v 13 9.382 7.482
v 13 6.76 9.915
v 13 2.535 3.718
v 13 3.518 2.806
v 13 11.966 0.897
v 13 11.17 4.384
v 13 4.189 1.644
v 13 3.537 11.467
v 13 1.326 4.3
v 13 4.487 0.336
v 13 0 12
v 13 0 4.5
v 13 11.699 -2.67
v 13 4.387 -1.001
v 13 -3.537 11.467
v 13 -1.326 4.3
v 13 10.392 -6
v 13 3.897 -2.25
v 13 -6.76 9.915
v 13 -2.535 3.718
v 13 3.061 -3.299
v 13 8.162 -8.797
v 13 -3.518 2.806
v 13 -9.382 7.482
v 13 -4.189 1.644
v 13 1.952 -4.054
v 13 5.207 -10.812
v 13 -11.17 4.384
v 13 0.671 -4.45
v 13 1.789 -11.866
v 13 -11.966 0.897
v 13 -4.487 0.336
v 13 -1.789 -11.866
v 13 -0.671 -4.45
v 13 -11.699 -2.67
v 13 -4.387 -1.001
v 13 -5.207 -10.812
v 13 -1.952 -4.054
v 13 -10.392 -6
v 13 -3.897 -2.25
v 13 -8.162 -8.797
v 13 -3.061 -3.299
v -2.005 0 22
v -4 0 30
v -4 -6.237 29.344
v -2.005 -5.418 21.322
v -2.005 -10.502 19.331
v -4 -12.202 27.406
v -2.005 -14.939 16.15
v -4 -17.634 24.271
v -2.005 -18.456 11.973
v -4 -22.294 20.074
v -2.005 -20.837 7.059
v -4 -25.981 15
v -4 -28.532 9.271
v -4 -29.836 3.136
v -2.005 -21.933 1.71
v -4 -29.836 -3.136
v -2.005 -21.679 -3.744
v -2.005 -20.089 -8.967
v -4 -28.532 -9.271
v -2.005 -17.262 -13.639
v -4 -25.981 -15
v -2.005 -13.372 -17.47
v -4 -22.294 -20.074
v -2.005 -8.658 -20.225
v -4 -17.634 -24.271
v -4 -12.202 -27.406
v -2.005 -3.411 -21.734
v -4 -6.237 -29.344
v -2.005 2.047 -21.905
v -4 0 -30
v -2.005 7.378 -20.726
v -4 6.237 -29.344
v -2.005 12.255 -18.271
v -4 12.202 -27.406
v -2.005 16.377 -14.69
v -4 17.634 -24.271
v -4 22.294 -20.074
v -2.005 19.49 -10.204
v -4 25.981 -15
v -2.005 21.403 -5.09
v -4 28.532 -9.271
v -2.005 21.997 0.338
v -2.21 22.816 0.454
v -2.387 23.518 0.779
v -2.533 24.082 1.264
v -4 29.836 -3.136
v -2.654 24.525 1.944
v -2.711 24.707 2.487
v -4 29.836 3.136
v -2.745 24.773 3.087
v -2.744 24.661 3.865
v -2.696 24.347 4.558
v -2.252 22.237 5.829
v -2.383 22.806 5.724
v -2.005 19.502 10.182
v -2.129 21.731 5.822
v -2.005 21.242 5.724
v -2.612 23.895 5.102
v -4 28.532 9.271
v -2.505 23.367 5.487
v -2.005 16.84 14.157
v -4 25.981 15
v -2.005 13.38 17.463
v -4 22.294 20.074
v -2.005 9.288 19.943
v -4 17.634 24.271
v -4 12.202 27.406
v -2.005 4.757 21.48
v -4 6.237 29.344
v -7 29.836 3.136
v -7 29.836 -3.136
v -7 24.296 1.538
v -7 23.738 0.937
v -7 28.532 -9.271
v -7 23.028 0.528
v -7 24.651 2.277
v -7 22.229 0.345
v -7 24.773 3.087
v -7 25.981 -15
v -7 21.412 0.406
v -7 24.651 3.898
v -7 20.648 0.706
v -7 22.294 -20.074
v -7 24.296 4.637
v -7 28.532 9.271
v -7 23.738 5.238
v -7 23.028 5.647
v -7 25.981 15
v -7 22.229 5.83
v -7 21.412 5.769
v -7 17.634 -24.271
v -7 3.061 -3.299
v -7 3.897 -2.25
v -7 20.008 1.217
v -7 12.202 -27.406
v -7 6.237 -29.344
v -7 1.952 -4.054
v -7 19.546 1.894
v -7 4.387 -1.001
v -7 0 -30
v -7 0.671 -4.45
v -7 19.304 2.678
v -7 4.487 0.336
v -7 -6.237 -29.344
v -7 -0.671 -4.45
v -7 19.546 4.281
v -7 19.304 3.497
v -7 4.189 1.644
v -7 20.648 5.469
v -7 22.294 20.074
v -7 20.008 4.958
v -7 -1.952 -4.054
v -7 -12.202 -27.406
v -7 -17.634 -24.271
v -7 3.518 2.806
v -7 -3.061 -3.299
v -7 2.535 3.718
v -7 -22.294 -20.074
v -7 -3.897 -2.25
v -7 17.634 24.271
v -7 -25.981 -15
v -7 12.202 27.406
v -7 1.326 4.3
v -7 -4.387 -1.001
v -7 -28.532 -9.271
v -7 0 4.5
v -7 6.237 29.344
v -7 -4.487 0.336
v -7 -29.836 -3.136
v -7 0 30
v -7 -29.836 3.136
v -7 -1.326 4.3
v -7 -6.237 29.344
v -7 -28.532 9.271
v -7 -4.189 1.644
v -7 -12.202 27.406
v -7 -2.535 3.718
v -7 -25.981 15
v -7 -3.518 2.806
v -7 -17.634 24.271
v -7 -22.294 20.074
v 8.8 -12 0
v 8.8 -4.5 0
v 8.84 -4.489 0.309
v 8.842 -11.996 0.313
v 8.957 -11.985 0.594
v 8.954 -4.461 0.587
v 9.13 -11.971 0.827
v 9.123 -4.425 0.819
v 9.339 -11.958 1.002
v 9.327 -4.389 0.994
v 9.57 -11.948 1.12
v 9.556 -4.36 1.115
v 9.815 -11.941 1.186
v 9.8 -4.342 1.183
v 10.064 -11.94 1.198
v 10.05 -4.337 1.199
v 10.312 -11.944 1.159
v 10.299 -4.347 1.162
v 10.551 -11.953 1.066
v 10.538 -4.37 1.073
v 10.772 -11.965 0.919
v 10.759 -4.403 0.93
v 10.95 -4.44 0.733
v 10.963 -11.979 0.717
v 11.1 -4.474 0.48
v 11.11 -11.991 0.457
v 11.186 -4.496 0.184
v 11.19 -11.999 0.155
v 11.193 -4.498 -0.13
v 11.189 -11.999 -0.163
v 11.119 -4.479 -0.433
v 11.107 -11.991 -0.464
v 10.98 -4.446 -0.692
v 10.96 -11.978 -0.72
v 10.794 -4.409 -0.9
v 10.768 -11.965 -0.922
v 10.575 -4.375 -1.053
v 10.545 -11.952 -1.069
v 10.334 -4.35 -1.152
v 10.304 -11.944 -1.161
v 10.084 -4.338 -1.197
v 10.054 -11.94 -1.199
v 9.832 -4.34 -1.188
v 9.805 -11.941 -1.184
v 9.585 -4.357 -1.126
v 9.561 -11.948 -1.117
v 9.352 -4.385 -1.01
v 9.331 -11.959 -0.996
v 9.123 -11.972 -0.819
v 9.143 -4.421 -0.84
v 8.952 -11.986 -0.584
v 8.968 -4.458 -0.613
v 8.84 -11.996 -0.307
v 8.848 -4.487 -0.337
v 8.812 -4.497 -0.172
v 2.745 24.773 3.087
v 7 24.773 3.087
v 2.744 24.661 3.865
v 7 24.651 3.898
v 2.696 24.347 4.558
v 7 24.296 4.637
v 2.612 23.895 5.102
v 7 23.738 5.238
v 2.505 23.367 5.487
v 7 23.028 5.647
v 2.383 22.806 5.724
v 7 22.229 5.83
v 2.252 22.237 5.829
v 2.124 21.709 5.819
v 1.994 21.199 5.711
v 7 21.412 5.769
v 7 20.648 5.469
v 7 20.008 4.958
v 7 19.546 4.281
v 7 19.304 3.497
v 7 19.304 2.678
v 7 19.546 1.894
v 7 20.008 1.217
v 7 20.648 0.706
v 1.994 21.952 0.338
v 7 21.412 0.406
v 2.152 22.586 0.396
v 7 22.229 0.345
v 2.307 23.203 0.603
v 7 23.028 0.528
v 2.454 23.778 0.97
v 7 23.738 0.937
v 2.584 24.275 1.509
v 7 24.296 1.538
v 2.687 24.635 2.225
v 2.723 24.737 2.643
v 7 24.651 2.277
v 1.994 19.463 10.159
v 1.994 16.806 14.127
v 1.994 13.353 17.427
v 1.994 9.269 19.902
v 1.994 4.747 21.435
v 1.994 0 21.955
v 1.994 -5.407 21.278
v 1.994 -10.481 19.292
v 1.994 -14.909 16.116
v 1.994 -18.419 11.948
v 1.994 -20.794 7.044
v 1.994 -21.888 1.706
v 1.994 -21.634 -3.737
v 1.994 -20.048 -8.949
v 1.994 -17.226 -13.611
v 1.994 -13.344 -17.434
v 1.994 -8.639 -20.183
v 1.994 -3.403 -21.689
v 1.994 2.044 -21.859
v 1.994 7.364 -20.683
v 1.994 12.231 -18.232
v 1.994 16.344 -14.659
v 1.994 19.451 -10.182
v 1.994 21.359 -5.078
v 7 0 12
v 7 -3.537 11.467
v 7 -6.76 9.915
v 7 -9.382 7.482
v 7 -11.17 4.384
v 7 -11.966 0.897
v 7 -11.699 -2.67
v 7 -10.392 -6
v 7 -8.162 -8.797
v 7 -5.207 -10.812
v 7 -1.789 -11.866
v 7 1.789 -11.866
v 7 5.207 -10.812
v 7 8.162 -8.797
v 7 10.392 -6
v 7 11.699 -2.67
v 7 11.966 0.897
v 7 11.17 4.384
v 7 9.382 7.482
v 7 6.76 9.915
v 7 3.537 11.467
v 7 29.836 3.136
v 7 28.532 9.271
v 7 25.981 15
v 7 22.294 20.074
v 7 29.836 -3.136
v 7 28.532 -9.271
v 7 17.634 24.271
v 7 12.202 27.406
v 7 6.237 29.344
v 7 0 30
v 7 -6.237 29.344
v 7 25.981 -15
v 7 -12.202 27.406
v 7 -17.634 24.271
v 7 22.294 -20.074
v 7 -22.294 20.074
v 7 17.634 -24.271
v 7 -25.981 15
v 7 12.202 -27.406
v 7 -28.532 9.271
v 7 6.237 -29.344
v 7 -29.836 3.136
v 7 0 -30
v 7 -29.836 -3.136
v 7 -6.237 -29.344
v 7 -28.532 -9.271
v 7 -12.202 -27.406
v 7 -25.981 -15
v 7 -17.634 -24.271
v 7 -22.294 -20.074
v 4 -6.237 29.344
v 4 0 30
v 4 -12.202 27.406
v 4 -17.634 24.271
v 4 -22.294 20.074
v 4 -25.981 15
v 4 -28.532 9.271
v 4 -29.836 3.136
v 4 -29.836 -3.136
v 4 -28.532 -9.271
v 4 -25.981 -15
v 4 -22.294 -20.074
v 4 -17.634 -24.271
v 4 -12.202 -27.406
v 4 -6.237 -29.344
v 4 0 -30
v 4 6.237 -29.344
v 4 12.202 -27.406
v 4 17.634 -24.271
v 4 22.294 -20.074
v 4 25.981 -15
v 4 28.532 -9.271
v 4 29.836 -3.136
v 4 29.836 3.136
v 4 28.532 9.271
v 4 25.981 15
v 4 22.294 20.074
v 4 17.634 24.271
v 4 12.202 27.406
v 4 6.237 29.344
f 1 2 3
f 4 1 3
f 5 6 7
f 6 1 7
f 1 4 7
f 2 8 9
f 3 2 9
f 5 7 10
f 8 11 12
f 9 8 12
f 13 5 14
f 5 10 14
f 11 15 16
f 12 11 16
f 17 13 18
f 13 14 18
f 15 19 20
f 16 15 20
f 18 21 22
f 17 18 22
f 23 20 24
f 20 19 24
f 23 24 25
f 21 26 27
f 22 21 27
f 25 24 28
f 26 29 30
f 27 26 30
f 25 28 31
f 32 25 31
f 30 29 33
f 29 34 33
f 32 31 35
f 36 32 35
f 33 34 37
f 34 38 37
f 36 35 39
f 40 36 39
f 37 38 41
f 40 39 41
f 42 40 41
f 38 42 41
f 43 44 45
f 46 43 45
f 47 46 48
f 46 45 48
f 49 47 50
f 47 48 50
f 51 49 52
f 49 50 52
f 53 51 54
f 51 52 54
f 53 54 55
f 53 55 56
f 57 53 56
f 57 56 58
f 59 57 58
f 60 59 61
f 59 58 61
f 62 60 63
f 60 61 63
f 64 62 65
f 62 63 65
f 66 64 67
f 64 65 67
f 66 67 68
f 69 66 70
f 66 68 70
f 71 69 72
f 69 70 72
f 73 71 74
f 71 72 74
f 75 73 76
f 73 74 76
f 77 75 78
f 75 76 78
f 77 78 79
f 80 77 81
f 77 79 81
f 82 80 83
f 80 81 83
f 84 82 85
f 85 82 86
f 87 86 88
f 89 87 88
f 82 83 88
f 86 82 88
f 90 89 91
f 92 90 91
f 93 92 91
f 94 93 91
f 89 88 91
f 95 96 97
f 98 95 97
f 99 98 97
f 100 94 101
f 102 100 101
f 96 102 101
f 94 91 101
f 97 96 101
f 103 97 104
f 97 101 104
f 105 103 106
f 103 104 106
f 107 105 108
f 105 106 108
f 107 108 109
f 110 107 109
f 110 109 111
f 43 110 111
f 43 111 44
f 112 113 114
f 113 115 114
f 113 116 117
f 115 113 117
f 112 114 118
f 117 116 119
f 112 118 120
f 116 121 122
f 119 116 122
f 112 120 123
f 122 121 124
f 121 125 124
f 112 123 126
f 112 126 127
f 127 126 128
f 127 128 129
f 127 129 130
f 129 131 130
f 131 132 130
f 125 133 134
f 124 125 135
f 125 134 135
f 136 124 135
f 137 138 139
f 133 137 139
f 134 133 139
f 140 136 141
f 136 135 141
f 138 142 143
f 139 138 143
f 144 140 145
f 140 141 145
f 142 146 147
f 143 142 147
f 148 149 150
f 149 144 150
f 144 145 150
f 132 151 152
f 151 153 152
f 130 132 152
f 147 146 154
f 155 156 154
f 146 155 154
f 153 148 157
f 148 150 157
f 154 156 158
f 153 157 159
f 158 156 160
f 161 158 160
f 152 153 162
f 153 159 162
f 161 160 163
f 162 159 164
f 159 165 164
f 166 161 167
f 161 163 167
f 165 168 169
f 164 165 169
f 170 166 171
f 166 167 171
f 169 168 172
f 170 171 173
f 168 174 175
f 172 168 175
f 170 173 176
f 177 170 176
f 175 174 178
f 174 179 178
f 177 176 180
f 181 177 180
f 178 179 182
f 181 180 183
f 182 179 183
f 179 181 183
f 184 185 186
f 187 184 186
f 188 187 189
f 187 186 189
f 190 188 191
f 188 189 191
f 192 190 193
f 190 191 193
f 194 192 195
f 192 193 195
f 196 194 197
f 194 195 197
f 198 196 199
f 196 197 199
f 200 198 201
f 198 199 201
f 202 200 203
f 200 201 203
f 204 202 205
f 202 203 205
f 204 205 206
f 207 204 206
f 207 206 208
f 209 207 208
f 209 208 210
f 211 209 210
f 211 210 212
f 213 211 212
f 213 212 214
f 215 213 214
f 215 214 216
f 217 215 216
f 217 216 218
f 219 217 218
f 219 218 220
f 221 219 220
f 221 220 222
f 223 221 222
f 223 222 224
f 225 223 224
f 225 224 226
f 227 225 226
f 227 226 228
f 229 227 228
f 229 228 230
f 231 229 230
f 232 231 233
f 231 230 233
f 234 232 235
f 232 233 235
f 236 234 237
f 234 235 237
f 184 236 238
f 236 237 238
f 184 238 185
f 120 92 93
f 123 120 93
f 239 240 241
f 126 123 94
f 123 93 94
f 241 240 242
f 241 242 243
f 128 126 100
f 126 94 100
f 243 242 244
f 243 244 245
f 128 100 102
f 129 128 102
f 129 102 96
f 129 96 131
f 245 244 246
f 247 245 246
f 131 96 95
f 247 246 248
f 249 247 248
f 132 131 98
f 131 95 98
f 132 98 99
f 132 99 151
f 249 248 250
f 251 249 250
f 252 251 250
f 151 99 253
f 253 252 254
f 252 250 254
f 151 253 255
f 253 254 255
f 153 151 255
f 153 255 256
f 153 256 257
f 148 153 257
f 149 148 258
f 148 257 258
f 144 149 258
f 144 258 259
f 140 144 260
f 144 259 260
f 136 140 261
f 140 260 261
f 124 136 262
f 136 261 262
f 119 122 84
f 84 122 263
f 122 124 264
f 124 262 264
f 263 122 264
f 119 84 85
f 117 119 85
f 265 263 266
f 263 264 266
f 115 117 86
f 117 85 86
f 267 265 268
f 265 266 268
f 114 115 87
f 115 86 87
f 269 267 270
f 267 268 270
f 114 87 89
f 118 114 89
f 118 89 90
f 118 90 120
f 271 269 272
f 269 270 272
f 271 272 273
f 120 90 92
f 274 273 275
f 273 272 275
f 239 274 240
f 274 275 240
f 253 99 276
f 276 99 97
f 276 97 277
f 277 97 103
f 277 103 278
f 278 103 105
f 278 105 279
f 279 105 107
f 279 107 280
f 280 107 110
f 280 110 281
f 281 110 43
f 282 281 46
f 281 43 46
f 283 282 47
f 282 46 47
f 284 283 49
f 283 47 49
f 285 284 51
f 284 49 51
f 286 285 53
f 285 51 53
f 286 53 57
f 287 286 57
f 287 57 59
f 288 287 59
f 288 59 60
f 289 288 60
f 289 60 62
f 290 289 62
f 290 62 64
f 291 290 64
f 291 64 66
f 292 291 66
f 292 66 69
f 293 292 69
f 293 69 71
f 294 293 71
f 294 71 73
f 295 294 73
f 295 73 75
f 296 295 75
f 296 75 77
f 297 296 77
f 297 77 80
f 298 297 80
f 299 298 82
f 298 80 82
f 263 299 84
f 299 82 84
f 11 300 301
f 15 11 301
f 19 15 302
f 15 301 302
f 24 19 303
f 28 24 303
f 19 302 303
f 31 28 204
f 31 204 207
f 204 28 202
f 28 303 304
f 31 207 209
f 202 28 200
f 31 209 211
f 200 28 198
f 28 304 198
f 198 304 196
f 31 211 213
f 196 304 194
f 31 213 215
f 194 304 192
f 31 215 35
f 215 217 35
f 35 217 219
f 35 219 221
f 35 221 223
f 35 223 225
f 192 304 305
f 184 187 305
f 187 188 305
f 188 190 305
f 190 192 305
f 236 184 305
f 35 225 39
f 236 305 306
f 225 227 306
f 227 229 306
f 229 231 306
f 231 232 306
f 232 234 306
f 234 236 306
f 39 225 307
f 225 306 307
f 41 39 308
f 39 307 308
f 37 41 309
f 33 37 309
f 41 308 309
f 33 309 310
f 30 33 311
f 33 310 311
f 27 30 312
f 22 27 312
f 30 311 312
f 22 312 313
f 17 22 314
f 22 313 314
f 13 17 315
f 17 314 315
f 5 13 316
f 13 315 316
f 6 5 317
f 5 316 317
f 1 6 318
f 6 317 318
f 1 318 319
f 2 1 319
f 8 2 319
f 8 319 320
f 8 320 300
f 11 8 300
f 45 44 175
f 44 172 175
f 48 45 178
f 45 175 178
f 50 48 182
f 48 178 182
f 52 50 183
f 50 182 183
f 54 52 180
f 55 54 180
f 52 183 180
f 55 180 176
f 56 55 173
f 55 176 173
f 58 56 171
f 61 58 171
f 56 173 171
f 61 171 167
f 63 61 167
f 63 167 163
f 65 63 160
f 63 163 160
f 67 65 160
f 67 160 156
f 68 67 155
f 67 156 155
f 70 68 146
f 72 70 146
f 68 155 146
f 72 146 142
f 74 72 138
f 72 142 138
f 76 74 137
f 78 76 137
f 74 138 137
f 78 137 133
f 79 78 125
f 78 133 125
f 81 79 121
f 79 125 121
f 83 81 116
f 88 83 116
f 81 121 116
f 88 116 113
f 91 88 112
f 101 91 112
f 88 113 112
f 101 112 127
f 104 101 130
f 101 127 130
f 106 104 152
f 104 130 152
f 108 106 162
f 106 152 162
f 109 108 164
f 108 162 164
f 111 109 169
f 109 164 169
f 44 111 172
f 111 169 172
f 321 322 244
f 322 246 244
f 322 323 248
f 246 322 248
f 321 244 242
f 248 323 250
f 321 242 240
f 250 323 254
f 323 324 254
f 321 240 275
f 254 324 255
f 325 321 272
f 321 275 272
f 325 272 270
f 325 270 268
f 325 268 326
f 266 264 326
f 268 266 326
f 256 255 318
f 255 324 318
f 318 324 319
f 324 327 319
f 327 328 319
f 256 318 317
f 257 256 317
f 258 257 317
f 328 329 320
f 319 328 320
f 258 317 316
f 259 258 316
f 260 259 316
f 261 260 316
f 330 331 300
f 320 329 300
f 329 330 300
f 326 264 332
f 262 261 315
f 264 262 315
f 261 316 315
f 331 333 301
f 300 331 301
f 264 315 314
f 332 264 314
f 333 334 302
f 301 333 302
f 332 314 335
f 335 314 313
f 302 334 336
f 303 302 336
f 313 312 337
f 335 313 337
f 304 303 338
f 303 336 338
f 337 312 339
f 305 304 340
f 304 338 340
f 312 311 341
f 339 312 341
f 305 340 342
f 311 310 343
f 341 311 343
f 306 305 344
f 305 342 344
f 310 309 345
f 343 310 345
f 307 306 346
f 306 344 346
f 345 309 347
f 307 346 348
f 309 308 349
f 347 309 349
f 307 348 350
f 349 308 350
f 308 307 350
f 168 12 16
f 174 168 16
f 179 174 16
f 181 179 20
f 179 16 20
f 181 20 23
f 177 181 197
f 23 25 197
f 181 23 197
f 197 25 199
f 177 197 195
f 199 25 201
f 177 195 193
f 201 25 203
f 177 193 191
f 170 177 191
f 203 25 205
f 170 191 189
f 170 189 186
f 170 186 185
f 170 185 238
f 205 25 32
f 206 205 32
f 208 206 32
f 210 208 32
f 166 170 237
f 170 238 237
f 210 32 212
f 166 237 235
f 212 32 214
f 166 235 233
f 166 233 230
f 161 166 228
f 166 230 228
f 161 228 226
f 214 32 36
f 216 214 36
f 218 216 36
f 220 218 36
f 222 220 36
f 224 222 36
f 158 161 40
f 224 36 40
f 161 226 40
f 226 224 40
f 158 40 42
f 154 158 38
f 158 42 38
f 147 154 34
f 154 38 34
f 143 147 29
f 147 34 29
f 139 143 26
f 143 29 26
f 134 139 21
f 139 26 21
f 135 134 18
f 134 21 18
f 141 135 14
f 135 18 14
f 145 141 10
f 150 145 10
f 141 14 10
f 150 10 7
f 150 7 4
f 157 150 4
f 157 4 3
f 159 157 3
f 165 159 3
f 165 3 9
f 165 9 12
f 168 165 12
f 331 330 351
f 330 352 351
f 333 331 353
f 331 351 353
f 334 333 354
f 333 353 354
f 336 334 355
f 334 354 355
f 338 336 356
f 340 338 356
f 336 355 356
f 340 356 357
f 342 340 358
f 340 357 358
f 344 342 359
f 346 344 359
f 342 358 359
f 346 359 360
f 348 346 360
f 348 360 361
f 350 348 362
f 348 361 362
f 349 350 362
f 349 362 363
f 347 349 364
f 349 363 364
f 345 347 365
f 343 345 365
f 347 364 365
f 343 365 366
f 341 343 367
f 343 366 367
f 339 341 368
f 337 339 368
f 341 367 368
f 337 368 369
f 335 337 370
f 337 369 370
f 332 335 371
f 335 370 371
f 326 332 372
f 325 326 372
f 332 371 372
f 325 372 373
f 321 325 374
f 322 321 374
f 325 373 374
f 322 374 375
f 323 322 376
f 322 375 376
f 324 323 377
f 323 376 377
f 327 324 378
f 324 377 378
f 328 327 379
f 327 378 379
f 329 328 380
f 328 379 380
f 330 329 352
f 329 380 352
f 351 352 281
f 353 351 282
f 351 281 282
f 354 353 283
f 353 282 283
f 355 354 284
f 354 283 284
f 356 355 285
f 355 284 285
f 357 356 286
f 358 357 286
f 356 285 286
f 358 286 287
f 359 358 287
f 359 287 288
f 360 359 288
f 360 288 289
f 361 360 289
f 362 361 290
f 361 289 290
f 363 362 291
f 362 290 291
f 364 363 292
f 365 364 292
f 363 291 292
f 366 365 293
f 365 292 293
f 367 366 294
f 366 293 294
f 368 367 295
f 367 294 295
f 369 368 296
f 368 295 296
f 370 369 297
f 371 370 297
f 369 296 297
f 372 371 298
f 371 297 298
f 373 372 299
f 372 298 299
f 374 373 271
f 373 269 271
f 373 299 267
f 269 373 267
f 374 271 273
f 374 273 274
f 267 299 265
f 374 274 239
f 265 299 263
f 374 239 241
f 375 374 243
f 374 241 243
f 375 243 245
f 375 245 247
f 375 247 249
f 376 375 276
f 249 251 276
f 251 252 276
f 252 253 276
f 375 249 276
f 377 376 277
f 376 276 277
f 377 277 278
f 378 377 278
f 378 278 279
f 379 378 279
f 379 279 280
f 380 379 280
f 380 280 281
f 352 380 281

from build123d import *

# Parameters (mm, degrees)
F3_D     = 5.5
F3_DEPTH = 14
F3_TIP   = 1.6523667023
F6_D     = 2.4
F6_DEPTH = 13.4
F6_TIP   = 0.7210327428


with BuildPart() as f1:
    # F0 (on Front) → F1 (revolve)
    with BuildSketch(Plane.XZ):
        Polygon((-7, 30), (-7, 4.5), (13, 4.5), (13, 12), (7, 12), (7, 30), (4, 30), (1.9940651348, 21.9546346889), (-2.0053759773, 22), (-4, 30), align=None)
    revolve(axis=Axis((0, 0, 0), (1, 0, 0)))

    # F3
    with Locations(Plane(origin=(-7, 0, 0), x_dir=(0, -1, 0), z_dir=(-1, 0, 0))):
        with Locations((-22.0234822482, 3.0874926597)):
            Hole(F3_D / 2, depth=F3_DEPTH)
            with Locations((0, 0, -(F3_DEPTH + F3_TIP / 2))):  # 118° drill point
                Cone(0, F3_D / 2, F3_TIP, mode=Mode.SUBTRACT)

    # F6
    with Locations(Plane.XZ.offset(12)):
        with Locations((10, 0)):
            Hole(F6_D / 2, depth=F6_DEPTH)
            with Locations((0, 0, -(F6_DEPTH + F6_TIP / 2))):  # 118° drill point
                Cone(0, F6_D / 2, F6_TIP, mode=Mode.SUBTRACT)


solid = f1.part
